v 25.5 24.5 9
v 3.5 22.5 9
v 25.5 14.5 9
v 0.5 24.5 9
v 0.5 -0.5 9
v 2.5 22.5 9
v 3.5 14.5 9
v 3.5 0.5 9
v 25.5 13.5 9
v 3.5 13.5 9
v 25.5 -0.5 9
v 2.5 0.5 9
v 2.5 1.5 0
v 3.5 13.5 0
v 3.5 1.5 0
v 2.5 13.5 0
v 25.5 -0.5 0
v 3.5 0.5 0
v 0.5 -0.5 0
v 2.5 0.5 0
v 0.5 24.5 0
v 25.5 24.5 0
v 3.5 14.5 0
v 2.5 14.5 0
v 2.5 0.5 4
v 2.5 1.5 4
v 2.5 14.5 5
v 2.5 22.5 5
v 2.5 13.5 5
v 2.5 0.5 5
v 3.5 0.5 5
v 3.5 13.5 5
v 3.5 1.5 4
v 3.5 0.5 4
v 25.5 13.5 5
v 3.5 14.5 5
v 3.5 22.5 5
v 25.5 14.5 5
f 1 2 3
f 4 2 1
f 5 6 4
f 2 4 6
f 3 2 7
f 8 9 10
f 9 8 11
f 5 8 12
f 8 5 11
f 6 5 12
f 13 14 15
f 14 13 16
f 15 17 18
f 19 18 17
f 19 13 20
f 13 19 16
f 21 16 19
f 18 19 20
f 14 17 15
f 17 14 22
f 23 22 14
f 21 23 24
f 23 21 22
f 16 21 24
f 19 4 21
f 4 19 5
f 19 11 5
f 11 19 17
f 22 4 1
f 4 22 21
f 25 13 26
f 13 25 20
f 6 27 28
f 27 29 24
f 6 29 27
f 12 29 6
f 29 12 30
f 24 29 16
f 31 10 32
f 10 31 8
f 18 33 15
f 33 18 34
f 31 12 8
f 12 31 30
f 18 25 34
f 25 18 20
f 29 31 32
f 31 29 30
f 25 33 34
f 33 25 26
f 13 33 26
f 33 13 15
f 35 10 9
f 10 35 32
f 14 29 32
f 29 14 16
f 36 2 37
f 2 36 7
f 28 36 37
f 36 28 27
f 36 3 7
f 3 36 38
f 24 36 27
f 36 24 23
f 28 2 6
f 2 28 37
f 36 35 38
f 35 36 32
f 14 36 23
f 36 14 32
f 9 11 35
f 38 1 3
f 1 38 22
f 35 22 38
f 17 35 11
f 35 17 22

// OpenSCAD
union() {
    translate([1, 0, 4.5]) cube([1, 1, 9], center=true);
    translate([1, 1, 4.5]) cube([1, 1, 9], center=true);
    translate([1, 2, 4.5]) cube([1, 1, 9], center=true);
    translate([1, 3, 4.5]) cube([1, 1, 9], center=true);
    translate([1, 4, 4.5]) cube([1, 1, 9], center=true);
    translate([1, 5, 4.5]) cube([1, 1, 9], center=true);
    translate([1, 6, 4.5]) cube([1, 1, 9], center=true);
    translate([1, 7, 4.5]) cube([1, 1, 9], center=true);
    translate([1, 8, 4.5]) cube([1, 1, 9], center=true);
    translate([1, 9, 4.5]) cube([1, 1, 9], center=true);
    translate([1, 10, 4.5]) cube([1, 1, 9], center=true);
    translate([1, 11, 4.5]) cube([1, 1, 9], center=true);
    translate([1, 12, 4.5]) cube([1, 1, 9], center=true);
    translate([1, 13, 4.5]) cube([1, 1, 9], center=true);
    translate([1, 14, 4.5]) cube([1, 1, 9], center=true);
    translate([1, 15, 4.5]) cube([1, 1, 9], center=true);
    translate([1, 16, 4.5]) cube([1, 1, 9], center=true);
    translate([1, 17, 4.5]) cube([1, 1, 9], center=true);
    translate([1, 18, 4.5]) cube([1, 1, 9], center=true);
    translate([1, 19, 4.5]) cube([1, 1, 9], center=true);
    translate([1, 20, 4.5]) cube([1, 1, 9], center=true);
    translate([1, 21, 4.5]) cube([1, 1, 9], center=true);
    translate([1, 22, 4.5]) cube([1, 1, 9], center=true);
    translate([1, 23, 4.5]) cube([1, 1, 9], center=true);
    translate([1, 24, 4.5]) cube([1, 1, 9], center=true);
    translate([2, 0, 4.5]) cube([1, 1, 9], center=true);
    translate([2, 1, 4.5]) cube([1, 1, 9], center=true);
    translate([2, 2, 4.5]) cube([1, 1, 9], center=true);
    translate([2, 3, 4.5]) cube([1, 1, 9], center=true);
    translate([2, 4, 4.5]) cube([1, 1, 9], center=true);
    translate([2, 5, 4.5]) cube([1, 1, 9], center=true);
    translate([2, 6, 4.5]) cube([1, 1, 9], center=true);
    translate([2, 7, 4.5]) cube([1, 1, 9], center=true);
    translate([2, 8, 4.5]) cube([1, 1, 9], center=true);
    translate([2, 9, 4.5]) cube([1, 1, 9], center=true);
    translate([2, 10, 4.5]) cube([1, 1, 9], center=true);
    translate([2, 11, 4.5]) cube([1, 1, 9], center=true);
    translate([2, 12, 4.5]) cube([1, 1, 9], center=true);
    translate([2, 13, 4.5]) cube([1, 1, 9], center=true);
    translate([2, 14, 4.5]) cube([1, 1, 9], center=true);
    translate([2, 15, 4.5]) cube([1, 1, 9], center=true);
    translate([2, 16, 4.5]) cube([1, 1, 9], center=true);
    translate([2, 17, 4.5]) cube([1, 1, 9], center=true);
    translate([2, 18, 4.5]) cube([1, 1, 9], center=true);
    translate([2, 19, 4.5]) cube([1, 1, 9], center=true);
    translate([2, 20, 4.5]) cube([1, 1, 9], center=true);
    translate([2, 21, 4.5]) cube([1, 1, 9], center=true);
    translate([2, 22, 4.5]) cube([1, 1, 9], center=true);
    translate([2, 23, 4.5]) cube([1, 1, 9], center=true);
    translate([2, 24, 4.5]) cube([1, 1, 9], center=true);
    translate([3, 0, 4.5]) cube([1, 1, 9], center=true);
    translate([3, 1, 4.5]) color([1, 0, 0]) cube([1, 1, 1], center=true);
    translate([3, 2, 2.5]) cube([1, 1, 5], center=true);
    translate([3, 3, 2.5]) cube([1, 1, 5], center=true);
    translate([3, 4, 2.5]) cube([1, 1, 5], center=true);
    translate([3, 5, 2.5]) cube([1, 1, 5], center=true);
    translate([3, 6, 2.5]) cube([1, 1, 5], center=true);
    translate([3, 7, 2.5]) cube([1, 1, 5], center=true);
    translate([3, 8, 2.5]) cube([1, 1, 5], center=true);
    translate([3, 9, 2.5]) cube([1, 1, 5], center=true);
    translate([3, 10, 2.5]) cube([1, 1, 5], center=true);
    translate([3, 11, 2.5]) cube([1, 1, 5], center=true);
    translate([3, 12, 2.5]) cube([1, 1, 5], center=true);
    translate([3, 13, 2.5]) cube([1, 1, 5], center=true);
    translate([3, 15, 2.5]) cube([1, 1, 5], center=true);
    translate([3, 16, 2.5]) cube([1, 1, 5], center=true);
    translate([3, 17, 2.5]) cube([1, 1, 5], center=true);
    translate([3, 18, 2.5]) cube([1, 1, 5], center=true);
    translate([3, 19, 2.5]) cube([1, 1, 5], center=true);
    translate([3, 20, 2.5]) cube([1, 1, 5], center=true);
    translate([3, 21, 2.5]) cube([1, 1, 5], center=true);
    translate([3, 22, 2.5]) cube([1, 1, 5], center=true);
    translate([3, 23, 4.5]) cube([1, 1, 9], center=true);
    translate([3, 24, 4.5]) cube([1, 1, 9], center=true);
    translate([4, 0, 4.5]) cube([1, 1, 9], center=true);
    translate([4, 1, 4.5]) cube([1, 1, 9], center=true);
    translate([4, 2, 4.5]) cube([1, 1, 9], center=true);
    translate([4, 3, 4.5]) cube([1, 1, 9], center=true);
    translate([4, 4, 4.5]) cube([1, 1, 9], center=true);
    translate([4, 5, 4.5]) cube([1, 1, 9], center=true);
    translate([4, 6, 4.5]) cube([1, 1, 9], center=true);
    translate([4, 7, 4.5]) cube([1, 1, 9], center=true);
    translate([4, 8, 4.5]) cube([1, 1, 9], center=true);
    translate([4, 9, 4.5]) cube([1, 1, 9], center=true);
    translate([4, 10, 4.5]) cube([1, 1, 9], center=true);
    translate([4, 11, 4.5]) cube([1, 1, 9], center=true);
    translate([4, 12, 4.5]) cube([1, 1, 9], center=true);
    translate([4, 13, 4.5]) cube([1, 1, 9], center=true);
    translate([4, 14, 2.5]) cube([1, 1, 5], center=true);
    translate([4, 15, 4.5]) cube([1, 1, 9], center=true);
    translate([4, 16, 4.5]) cube([1, 1, 9], center=true);
    translate([4, 17, 4.5]) cube([1, 1, 9], center=true);
    translate([4, 18, 4.5]) cube([1, 1, 9], center=true);
    translate([4, 19, 4.5]) cube([1, 1, 9], center=true);
    translate([4, 20, 4.5]) cube([1, 1, 9], center=true);
    translate([4, 21, 4.5]) cube([1, 1, 9], center=true);
    translate([4, 22, 4.5]) cube([1, 1, 9], center=true);
    translate([4, 23, 4.5]) cube([1, 1, 9], center=true);
    translate([4, 24, 4.5]) cube([1, 1, 9], center=true);
    translate([5, 0, 4.5]) cube([1, 1, 9], center=true);
    translate([5, 1, 4.5]) cube([1, 1, 9], center=true);
    translate([5, 2, 4.5]) cube([1, 1, 9], center=true);
    translate([5, 3, 4.5]) cube([1, 1, 9], center=true);
    translate([5, 4, 4.5]) cube([1, 1, 9], center=true);
    translate([5, 5, 4.5]) cube([1, 1, 9], center=true);
    translate([5, 6, 4.5]) cube([1, 1, 9], center=true);
    translate([5, 7, 4.5]) cube([1, 1, 9], center=true);
    translate([5, 8, 4.5]) cube([1, 1, 9], center=true);
    translate([5, 9, 4.5]) cube([1, 1, 9], center=true);
    translate([5, 10, 4.5]) cube([1, 1, 9], center=true);
    translate([5, 11, 4.5]) cube([1, 1, 9], center=true);
    translate([5, 12, 4.5]) cube([1, 1, 9], center=true);
    translate([5, 13, 4.5]) cube([1, 1, 9], center=true);
    translate([5, 14, 2.5]) cube([1, 1, 5], center=true);
    translate([5, 15, 4.5]) cube([1, 1, 9], center=true);
    translate([5, 16, 4.5]) cube([1, 1, 9], center=true);
    translate([5, 17, 4.5]) cube([1, 1, 9], center=true);
    translate([5, 18, 4.5]) cube([1, 1, 9], center=true);
    translate([5, 19, 4.5]) cube([1, 1, 9], center=true);
    translate([5, 20, 4.5]) cube([1, 1, 9], center=true);
    translate([5, 21, 4.5]) cube([1, 1, 9], center=true);
    translate([5, 22, 4.5]) cube([1, 1, 9], center=true);
    translate([5, 23, 4.5]) cube([1, 1, 9], center=true);
    translate([5, 24, 4.5]) cube([1, 1, 9], center=true);
    translate([6, 0, 4.5]) cube([1, 1, 9], center=true);
    translate([6, 1, 4.5]) cube([1, 1, 9], center=true);
    translate([6, 2, 4.5]) cube([1, 1, 9], center=true);
    translate([6, 3, 4.5]) cube([1, 1, 9], center=true);
    translate([6, 4, 4.5]) cube([1, 1, 9], center=true);
    translate([6, 5, 4.5]) cube([1, 1, 9], center=true);
    translate([6, 6, 4.5]) cube([1, 1, 9], center=true);
    translate([6, 7, 4.5]) cube([1, 1, 9], center=true);
    translate([6, 8, 4.5]) cube([1, 1, 9], center=true);
    translate([6, 9, 4.5]) cube([1, 1, 9], center=true);
    translate([6, 10, 4.5]) cube([1, 1, 9], center=true);
    translate([6, 11, 4.5]) cube([1, 1, 9], center=true);
    translate([6, 12, 4.5]) cube([1, 1, 9], center=true);
    translate([6, 13, 4.5]) cube([1, 1, 9], center=true);
    translate([6, 14, 2.5]) cube([1, 1, 5], center=true);
    translate([6, 15, 4.5]) cube([1, 1, 9], center=true);
    translate([6, 16, 4.5]) cube([1, 1, 9], center=true);
    translate([6, 17, 4.5]) cube([1, 1, 9], center=true);
    translate([6, 18, 4.5]) cube([1, 1, 9], center=true);
    translate([6, 19, 4.5]) cube([1, 1, 9], center=true);
    translate([6, 20, 4.5]) cube([1, 1, 9], center=true);
    translate([6, 21, 4.5]) cube([1, 1, 9], center=true);
    translate([6, 22, 4.5]) cube([1, 1, 9], center=true);
    translate([6, 23, 4.5]) cube([1, 1, 9], center=true);
    translate([6, 24, 4.5]) cube([1, 1, 9], center=true);
    translate([7, 0, 4.5]) cube([1, 1, 9], center=true);
    translate([7, 1, 4.5]) cube([1, 1, 9], center=true);
    translate([7, 2, 4.5]) cube([1, 1, 9], center=true);
    translate([7, 3, 4.5]) cube([1, 1, 9], center=true);
    translate([7, 4, 4.5]) cube([1, 1, 9], center=true);
    translate([7, 5, 4.5]) cube([1, 1, 9], center=true);
    translate([7, 6, 4.5]) cube([1, 1, 9], center=true);
    translate([7, 7, 4.5]) cube([1, 1, 9], center=true);
    translate([7, 8, 4.5]) cube([1, 1, 9], center=true);
    translate([7, 9, 4.5]) cube([1, 1, 9], center=true);
    translate([7, 10, 4.5]) cube([1, 1, 9], center=true);
    translate([7, 11, 4.5]) cube([1, 1, 9], center=true);
    translate([7, 12, 4.5]) cube([1, 1, 9], center=true);
    translate([7, 13, 4.5]) cube([1, 1, 9], center=true);
    translate([7, 14, 2.5]) cube([1, 1, 5], center=true);
    translate([7, 15, 4.5]) cube([1, 1, 9], center=true);
    translate([7, 16, 4.5]) cube([1, 1, 9], center=true);
    translate([7, 17, 4.5]) cube([1, 1, 9], center=true);
    translate([7, 18, 4.5]) cube([1, 1, 9], center=true);
    translate([7, 19, 4.5]) cube([1, 1, 9], center=true);
    translate([7, 20, 4.5]) cube([1, 1, 9], center=true);
    translate([7, 21, 4.5]) cube([1, 1, 9], center=true);
    translate([7, 22, 4.5]) cube([1, 1, 9], center=true);
    translate([7, 23, 4.5]) cube([1, 1, 9], center=true);
    translate([7, 24, 4.5]) cube([1, 1, 9], center=true);
    translate([8, 0, 4.5]) cube([1, 1, 9], center=true);
    translate([8, 1, 4.5]) cube([1, 1, 9], center=true);
    translate([8, 2, 4.5]) cube([1, 1, 9], center=true);
    translate([8, 3, 4.5]) cube([1, 1, 9], center=true);
    translate([8, 4, 4.5]) cube([1, 1, 9], center=true);
    translate([8, 5, 4.5]) cube([1, 1, 9], center=true);
    translate([8, 6, 4.5]) cube([1, 1, 9], center=true);
    translate([8, 7, 4.5]) cube([1, 1, 9], center=true);
    translate([8, 8, 4.5]) cube([1, 1, 9], center=true);
    translate([8, 9, 4.5]) cube([1, 1, 9], center=true);
    translate([8, 10, 4.5]) cube([1, 1, 9], center=true);
    translate([8, 11, 4.5]) cube([1, 1, 9], center=true);
    translate([8, 12, 4.5]) cube([1, 1, 9], center=true);
    translate([8, 13, 4.5]) cube([1, 1, 9], center=true);
    translate([8, 14, 2.5]) cube([1, 1, 5], center=true);
    translate([8, 15, 4.5]) cube([1, 1, 9], center=true);
    translate([8, 16, 4.5]) cube([1, 1, 9], center=true);
    translate([8, 17, 4.5]) cube([1, 1, 9], center=true);
    translate([8, 18, 4.5]) cube([1, 1, 9], center=true);
    translate([8, 19, 4.5]) cube([1, 1, 9], center=true);
    translate([8, 20, 4.5]) cube([1, 1, 9], center=true);
    translate([8, 21, 4.5]) cube([1, 1, 9], center=true);
    translate([8, 22, 4.5]) cube([1, 1, 9], center=true);
    translate([8, 23, 4.5]) cube([1, 1, 9], center=true);
    translate([8, 24, 4.5]) cube([1, 1, 9], center=true);
    translate([9, 0, 4.5]) cube([1, 1, 9], center=true);
    translate([9, 1, 4.5]) cube([1, 1, 9], center=true);
    translate([9, 2, 4.5]) cube([1, 1, 9], center=true);
    translate([9, 3, 4.5]) cube([1, 1, 9], center=true);
    translate([9, 4, 4.5]) cube([1, 1, 9], center=true);
    translate([9, 5, 4.5]) cube([1, 1, 9], center=true);
    translate([9, 6, 4.5]) cube([1, 1, 9], center=true);
    translate([9, 7, 4.5]) cube([1, 1, 9], center=true);
    translate([9, 8, 4.5]) cube([1, 1, 9], center=true);
    translate([9, 9, 4.5]) cube([1, 1, 9], center=true);
    translate([9, 10, 4.5]) cube([1, 1, 9], center=true);
    translate([9, 11, 4.5]) cube([1, 1, 9], center=true);
    translate([9, 12, 4.5]) cube([1, 1, 9], center=true);
    translate([9, 13, 4.5]) cube([1, 1, 9], center=true);
    translate([9, 14, 2.5]) cube([1, 1, 5], center=true);
    translate([9, 15, 4.5]) cube([1, 1, 9], center=true);
    translate([9, 16, 4.5]) cube([1, 1, 9], center=true);
    translate([9, 17, 4.5]) cube([1, 1, 9], center=true);
    translate([9, 18, 4.5]) cube([1, 1, 9], center=true);
    translate([9, 19, 4.5]) cube([1, 1, 9], center=true);
    translate([9, 20, 4.5]) cube([1, 1, 9], center=true);
    translate([9, 21, 4.5]) cube([1, 1, 9], center=true);
    translate([9, 22, 4.5]) cube([1, 1, 9], center=true);
    translate([9, 23, 4.5]) cube([1, 1, 9], center=true);
    translate([9, 24, 4.5]) cube([1, 1, 9], center=true);
    translate([10, 0, 4.5]) cube([1, 1, 9], center=true);
    translate([10, 1, 4.5]) cube([1, 1, 9], center=true);
    translate([10, 2, 4.5]) cube([1, 1, 9], center=true);
    translate([10, 3, 4.5]) cube([1, 1, 9], center=true);
    translate([10, 4, 4.5]) cube([1, 1, 9], center=true);
    translate([10, 5, 4.5]) cube([1, 1, 9], center=true);
    translate([10, 6, 4.5]) cube([1, 1, 9], center=true);
    translate([10, 7, 4.5]) cube([1, 1, 9], center=true);
    translate([10, 8, 4.5]) cube([1, 1, 9], center=true);
    translate([10, 9, 4.5]) cube([1, 1, 9], center=true);
    translate([10, 10, 4.5]) cube([1, 1, 9], center=true);
    translate([10, 11, 4.5]) cube([1, 1, 9], center=true);
    translate([10, 12, 4.5]) cube([1, 1, 9], center=true);
    translate([10, 13, 4.5]) cube([1, 1, 9], center=true);
    translate([10, 14, 2.5]) cube([1, 1, 5], center=true);
    translate([10, 15, 4.5]) cube([1, 1, 9], center=true);
    translate([10, 16, 4.5]) cube([1, 1, 9], center=true);
    translate([10, 17, 4.5]) cube([1, 1, 9], center=true);
    translate([10, 18, 4.5]) cube([1, 1, 9], center=true);
    translate([10, 19, 4.5]) cube([1, 1, 9], center=true);
    translate([10, 20, 4.5]) cube([1, 1, 9], center=true);
    translate([10, 21, 4.5]) cube([1, 1, 9], center=true);
    translate([10, 22, 4.5]) cube([1, 1, 9], center=true);
    translate([10, 23, 4.5]) cube([1, 1, 9], center=true);
    translate([10, 24, 4.5]) cube([1, 1, 9], center=true);
    translate([11, 0, 4.5]) cube([1, 1, 9], center=true);
    translate([11, 1, 4.5]) cube([1, 1, 9], center=true);
    translate([11, 2, 4.5]) cube([1, 1, 9], center=true);
    translate([11, 3, 4.5]) cube([1, 1, 9], center=true);
    translate([11, 4, 4.5]) cube([1, 1, 9], center=true);
    translate([11, 5, 4.5]) cube([1, 1, 9], center=true);
    translate([11, 6, 4.5]) cube([1, 1, 9], center=true);
    translate([11, 7, 4.5]) cube([1, 1, 9], center=true);
    translate([11, 8, 4.5]) cube([1, 1, 9], center=true);
    translate([11, 9, 4.5]) cube([1, 1, 9], center=true);
    translate([11, 10, 4.5]) cube([1, 1, 9], center=true);
    translate([11, 11, 4.5]) cube([1, 1, 9], center=true);
    translate([11, 12, 4.5]) cube([1, 1, 9], center=true);
    translate([11, 13, 4.5]) cube([1, 1, 9], center=true);
    translate([11, 14, 2.5]) cube([1, 1, 5], center=true);
    translate([11, 15, 4.5]) cube([1, 1, 9], center=true);
    translate([11, 16, 4.5]) cube([1, 1, 9], center=true);
    translate([11, 17, 4.5]) cube([1, 1, 9], center=true);
    translate([11, 18, 4.5]) cube([1, 1, 9], center=true);
    translate([11, 19, 4.5]) cube([1, 1, 9], center=true);
    translate([11, 20, 4.5]) cube([1, 1, 9], center=true);
    translate([11, 21, 4.5]) cube([1, 1, 9], center=true);
    translate([11, 22, 4.5]) cube([1, 1, 9], center=true);
    translate([11, 23, 4.5]) cube([1, 1, 9], center=true);
    translate([11, 24, 4.5]) cube([1, 1, 9], center=true);
    translate([12, 0, 4.5]) cube([1, 1, 9], center=true);
    translate([12, 1, 4.5]) cube([1, 1, 9], center=true);
    translate([12, 2, 4.5]) cube([1, 1, 9], center=true);
    translate([12, 3, 4.5]) cube([1, 1, 9], center=true);
    translate([12, 4, 4.5]) cube([1, 1, 9], center=true);
    translate([12, 5, 4.5]) cube([1, 1, 9], center=true);
    translate([12, 6, 4.5]) cube([1, 1, 9], center=true);
    translate([12, 7, 4.5]) cube([1, 1, 9], center=true);
    translate([12, 8, 4.5]) cube([1, 1, 9], center=true);
    translate([12, 9, 4.5]) cube([1, 1, 9], center=true);
    translate([12, 10, 4.5]) cube([1, 1, 9], center=true);
    translate([12, 11, 4.5]) cube([1, 1, 9], center=true);
    translate([12, 12, 4.5]) cube([1, 1, 9], center=true);
    translate([12, 13, 4.5]) cube([1, 1, 9], center=true);
    translate([12, 14, 2.5]) cube([1, 1, 5], center=true);
    translate([12, 15, 4.5]) cube([1, 1, 9], center=true);
    translate([12, 16, 4.5]) cube([1, 1, 9], center=true);
    translate([12, 17, 4.5]) cube([1, 1, 9], center=true);
    translate([12, 18, 4.5]) cube([1, 1, 9], center=true);
    translate([12, 19, 4.5]) cube([1, 1, 9], center=true);
    translate([12, 20, 4.5]) cube([1, 1, 9], center=true);
    translate([12, 21, 4.5]) cube([1, 1, 9], center=true);
    translate([12, 22, 4.5]) cube([1, 1, 9], center=true);
    translate([12, 23, 4.5]) cube([1, 1, 9], center=true);
    translate([12, 24, 4.5]) cube([1, 1, 9], center=true);
    translate([13, 0, 4.5]) cube([1, 1, 9], center=true);
    translate([13, 1, 4.5]) cube([1, 1, 9], center=true);
    translate([13, 2, 4.5]) cube([1, 1, 9], center=true);
    translate([13, 3, 4.5]) cube([1, 1, 9], center=true);
    translate([13, 4, 4.5]) cube([1, 1, 9], center=true);
    translate([13, 5, 4.5]) cube([1, 1, 9], center=true);
    translate([13, 6, 4.5]) cube([1, 1, 9], center=true);
    translate([13, 7, 4.5]) cube([1, 1, 9], center=true);
    translate([13, 8, 4.5]) cube([1, 1, 9], center=true);
    translate([13, 9, 4.5]) cube([1, 1, 9], center=true);
    translate([13, 10, 4.5]) cube([1, 1, 9], center=true);
    translate([13, 11, 4.5]) cube([1, 1, 9], center=true);
    translate([13, 12, 4.5]) cube([1, 1, 9], center=true);
    translate([13, 13, 4.5]) cube([1, 1, 9], center=true);
    translate([13, 14, 2.5]) cube([1, 1, 5], center=true);
    translate([13, 15, 4.5]) cube([1, 1, 9], center=true);
    translate([13, 16, 4.5]) cube([1, 1, 9], center=true);
    translate([13, 17, 4.5]) cube([1, 1, 9], center=true);
    translate([13, 18, 4.5]) cube([1, 1, 9], center=true);
    translate([13, 19, 4.5]) cube([1, 1, 9], center=true);
    translate([13, 20, 4.5]) cube([1, 1, 9], center=true);
    translate([13, 21, 4.5]) cube([1, 1, 9], center=true);
    translate([13, 22, 4.5]) cube([1, 1, 9], center=true);
    translate([13, 23, 4.5]) cube([1, 1, 9], center=true);
    translate([13, 24, 4.5]) cube([1, 1, 9], center=true);
    translate([14, 0, 4.5]) cube([1, 1, 9], center=true);
    translate([14, 1, 4.5]) cube([1, 1, 9], center=true);
    translate([14, 2, 4.5]) cube([1, 1, 9], center=true);
    translate([14, 3, 4.5]) cube([1, 1, 9], center=true);
    translate([14, 4, 4.5]) cube([1, 1, 9], center=true);
    translate([14, 5, 4.5]) cube([1, 1, 9], center=true);
    translate([14, 6, 4.5]) cube([1, 1, 9], center=true);
    translate([14, 7, 4.5]) cube([1, 1, 9], center=true);
    translate([14, 8, 4.5]) cube([1, 1, 9], center=true);
    translate([14, 9, 4.5]) cube([1, 1, 9], center=true);
    translate([14, 10, 4.5]) cube([1, 1, 9], center=true);
    translate([14, 11, 4.5]) cube([1, 1, 9], center=true);
    translate([14, 12, 4.5]) cube([1, 1, 9], center=true);
    translate([14, 13, 4.5]) cube([1, 1, 9], center=true);
    translate([14, 14, 2.5]) cube([1, 1, 5], center=true);
    translate([14, 15, 4.5]) cube([1, 1, 9], center=true);
    translate([14, 16, 4.5]) cube([1, 1, 9], center=true);
    translate([14, 17, 4.5]) cube([1, 1, 9], center=true);
    translate([14, 18, 4.5]) cube([1, 1, 9], center=true);
    translate([14, 19, 4.5]) cube([1, 1, 9], center=true);
    translate([14, 20, 4.5]) cube([1, 1, 9], center=true);
    translate([14, 21, 4.5]) cube([1, 1, 9], center=true);
    translate([14, 22, 4.5]) cube([1, 1, 9], center=true);
    translate([14, 23, 4.5]) cube([1, 1, 9], center=true);
    translate([14, 24, 4.5]) cube([1, 1, 9], center=true);
    translate([15, 0, 4.5]) cube([1, 1, 9], center=true);
    translate([15, 1, 4.5]) cube([1, 1, 9], center=true);
    translate([15, 2, 4.5]) cube([1, 1, 9], center=true);
    translate([15, 3, 4.5]) cube([1, 1, 9], center=true);
    translate([15, 4, 4.5]) cube([1, 1, 9], center=true);
    translate([15, 5, 4.5]) cube([1, 1, 9], center=true);
    translate([15, 6, 4.5]) cube([1, 1, 9], center=true);
    translate([15, 7, 4.5]) cube([1, 1, 9], center=true);
    translate([15, 8, 4.5]) cube([1, 1, 9], center=true);
    translate([15, 9, 4.5]) cube([1, 1, 9], center=true);
    translate([15, 10, 4.5]) cube([1, 1, 9], center=true);
    translate([15, 11, 4.5]) cube([1, 1, 9], center=true);
    translate([15, 12, 4.5]) cube([1, 1, 9], center=true);
    translate([15, 13, 4.5]) cube([1, 1, 9], center=true);
    translate([15, 14, 2.5]) cube([1, 1, 5], center=true);
    translate([15, 15, 4.5]) cube([1, 1, 9], center=true);
    translate([15, 16, 4.5]) cube([1, 1, 9], center=true);
    translate([15, 17, 4.5]) cube([1, 1, 9], center=true);
    translate([15, 18, 4.5]) cube([1, 1, 9], center=true);
    translate([15, 19, 4.5]) cube([1, 1, 9], center=true);
    translate([15, 20, 4.5]) cube([1, 1, 9], center=true);
    translate([15, 21, 4.5]) cube([1, 1, 9], center=true);
    translate([15, 22, 4.5]) cube([1, 1, 9], center=true);
    translate([15, 23, 4.5]) cube([1, 1, 9], center=true);
    translate([15, 24, 4.5]) cube([1, 1, 9], center=true);
    translate([16, 0, 4.5]) cube([1, 1, 9], center=true);
    translate([16, 1, 4.5]) cube([1, 1, 9], center=true);
    translate([16, 2, 4.5]) cube([1, 1, 9], center=true);
    translate([16, 3, 4.5]) cube([1, 1, 9], center=true);
    translate([16, 4, 4.5]) cube([1, 1, 9], center=true);
    translate([16, 5, 4.5]) cube([1, 1, 9], center=true);
    translate([16, 6, 4.5]) cube([1, 1, 9], center=true);
    translate([16, 7, 4.5]) cube([1, 1, 9], center=true);
    translate([16, 8, 4.5]) cube([1, 1, 9], center=true);
    translate([16, 9, 4.5]) cube([1, 1, 9], center=true);
    translate([16, 10, 4.5]) cube([1, 1, 9], center=true);
    translate([16, 11, 4.5]) cube([1, 1, 9], center=true);
    translate([16, 12, 4.5]) cube([1, 1, 9], center=true);
    translate([16, 13, 4.5]) cube([1, 1, 9], center=true);
    translate([16, 14, 2.5]) cube([1, 1, 5], center=true);
    translate([16, 15, 4.5]) cube([1, 1, 9], center=true);
    translate([16, 16, 4.5]) cube([1, 1, 9], center=true);
    translate([16, 17, 4.5]) cube([1, 1, 9], center=true);
    translate([16, 18, 4.5]) cube([1, 1, 9], center=true);
    translate([16, 19, 4.5]) cube([1, 1, 9], center=true);
    translate([16, 20, 4.5]) cube([1, 1, 9], center=true);
    translate([16, 21, 4.5]) cube([1, 1, 9], center=true);
    translate([16, 22, 4.5]) cube([1, 1, 9], center=true);
    translate([16, 23, 4.5]) cube([1, 1, 9], center=true);
    translate([16, 24, 4.5]) cube([1, 1, 9], center=true);
    translate([17, 0, 4.5]) cube([1, 1, 9], center=true);
    translate([17, 1, 4.5]) cube([1, 1, 9], center=true);
    translate([17, 2, 4.5]) cube([1, 1, 9], center=true);
    translate([17, 3, 4.5]) cube([1, 1, 9], center=true);
    translate([17, 4, 4.5]) cube([1, 1, 9], center=true);
    translate([17, 5, 4.5]) cube([1, 1, 9], center=true);
    translate([17, 6, 4.5]) cube([1, 1, 9], center=true);
    translate([17, 7, 4.5]) cube([1, 1, 9], center=true);
    translate([17, 8, 4.5]) cube([1, 1, 9], center=true);
    translate([17, 9, 4.5]) cube([1, 1, 9], center=true);
    translate([17, 10, 4.5]) cube([1, 1, 9], center=true);
    translate([17, 11, 4.5]) cube([1, 1, 9], center=true);
    translate([17, 12, 4.5]) cube([1, 1, 9], center=true);
    translate([17, 13, 4.5]) cube([1, 1, 9], center=true);
    translate([17, 14, 2.5]) cube([1, 1, 5], center=true);
    translate([17, 15, 4.5]) cube([1, 1, 9], center=true);
    translate([17, 16, 4.5]) cube([1, 1, 9], center=true);
    translate([17, 17, 4.5]) cube([1, 1, 9], center=true);
    translate([17, 18, 4.5]) cube([1, 1, 9], center=true);
    translate([17, 19, 4.5]) cube([1, 1, 9], center=true);
    translate([17, 20, 4.5]) cube([1, 1, 9], center=true);
    translate([17, 21, 4.5]) cube([1, 1, 9], center=true);
    translate([17, 22, 4.5]) cube([1, 1, 9], center=true);
    translate([17, 23, 4.5]) cube([1, 1, 9], center=true);
    translate([17, 24, 4.5]) cube([1, 1, 9], center=true);
    translate([18, 0, 4.5]) cube([1, 1, 9], center=true);
    translate([18, 1, 4.5]) cube([1, 1, 9], center=true);
    translate([18, 2, 4.5]) cube([1, 1, 9], center=true);
    translate([18, 3, 4.5]) cube([1, 1, 9], center=true);
    translate([18, 4, 4.5]) cube([1, 1, 9], center=true);
    translate([18, 5, 4.5]) cube([1, 1, 9], center=true);
    translate([18, 6, 4.5]) cube([1, 1, 9], center=true);
    translate([18, 7, 4.5]) cube([1, 1, 9], center=true);
    translate([18, 8, 4.5]) cube([1, 1, 9], center=true);
    translate([18, 9, 4.5]) cube([1, 1, 9], center=true);
    translate([18, 10, 4.5]) cube([1, 1, 9], center=true);
    translate([18, 11, 4.5]) cube([1, 1, 9], center=true);
    translate([18, 12, 4.5]) cube([1, 1, 9], center=true);
    translate([18, 13, 4.5]) cube([1, 1, 9], center=true);
    translate([18, 14, 2.5]) cube([1, 1, 5], center=true);
    translate([18, 15, 4.5]) cube([1, 1, 9], center=true);
    translate([18, 16, 4.5]) cube([1, 1, 9], center=true);
    translate([18, 17, 4.5]) cube([1, 1, 9], center=true);
    translate([18, 18, 4.5]) cube([1, 1, 9], center=true);
    translate([18, 19, 4.5]) cube([1, 1, 9], center=true);
    translate([18, 20, 4.5]) cube([1, 1, 9], center=true);
    translate([18, 21, 4.5]) cube([1, 1, 9], center=true);
    translate([18, 22, 4.5]) cube([1, 1, 9], center=true);
    translate([18, 23, 4.5]) cube([1, 1, 9], center=true);
    translate([18, 24, 4.5]) cube([1, 1, 9], center=true);
    translate([19, 0, 4.5]) cube([1, 1, 9], center=true);
    translate([19, 1, 4.5]) cube([1, 1, 9], center=true);
    translate([19, 2, 4.5]) cube([1, 1, 9], center=true);
    translate([19, 3, 4.5]) cube([1, 1, 9], center=true);
    translate([19, 4, 4.5]) cube([1, 1, 9], center=true);
    translate([19, 5, 4.5]) cube([1, 1, 9], center=true);
    translate([19, 6, 4.5]) cube([1, 1, 9], center=true);
    translate([19, 7, 4.5]) cube([1, 1, 9], center=true);
    translate([19, 8, 4.5]) cube([1, 1, 9], center=true);
    translate([19, 9, 4.5]) cube([1, 1, 9], center=true);
    translate([19, 10, 4.5]) cube([1, 1, 9], center=true);
    translate([19, 11, 4.5]) cube([1, 1, 9], center=true);
    translate([19, 12, 4.5]) cube([1, 1, 9], center=true);
    translate([19, 13, 4.5]) cube([1, 1, 9], center=true);
    translate([19, 14, 2.5]) cube([1, 1, 5], center=true);
    translate([19, 15, 4.5]) cube([1, 1, 9], center=true);
    translate([19, 16, 4.5]) cube([1, 1, 9], center=true);
    translate([19, 17, 4.5]) cube([1, 1, 9], center=true);
    translate([19, 18, 4.5]) cube([1, 1, 9], center=true);
    translate([19, 19, 4.5]) cube([1, 1, 9], center=true);
    translate([19, 20, 4.5]) cube([1, 1, 9], center=true);
    translate([19, 21, 4.5]) cube([1, 1, 9], center=true);
    translate([19, 22, 4.5]) cube([1, 1, 9], center=true);
    translate([19, 23, 4.5]) cube([1, 1, 9], center=true);
    translate([19, 24, 4.5]) cube([1, 1, 9], center=true);
    translate([20, 0, 4.5]) cube([1, 1, 9], center=true);
    translate([20, 1, 4.5]) cube([1, 1, 9], center=true);
    translate([20, 2, 4.5]) cube([1, 1, 9], center=true);
    translate([20, 3, 4.5]) cube([1, 1, 9], center=true);
    translate([20, 4, 4.5]) cube([1, 1, 9], center=true);
    translate([20, 5, 4.5]) cube([1, 1, 9], center=true);
    translate([20, 6, 4.5]) cube([1, 1, 9], center=true);
    translate([20, 7, 4.5]) cube([1, 1, 9], center=true);
    translate([20, 8, 4.5]) cube([1, 1, 9], center=true);
    translate([20, 9, 4.5]) cube([1, 1, 9], center=true);
    translate([20, 10, 4.5]) cube([1, 1, 9], center=true);
    translate([20, 11, 4.5]) cube([1, 1, 9], center=true);
    translate([20, 12, 4.5]) cube([1, 1, 9], center=true);
    translate([20, 13, 4.5]) cube([1, 1, 9], center=true);
    translate([20, 14, 2.5]) cube([1, 1, 5], center=true);
    translate([20, 15, 4.5]) cube([1, 1, 9], center=true);
    translate([20, 16, 4.5]) cube([1, 1, 9], center=true);
    translate([20, 17, 4.5]) cube([1, 1, 9], center=true);
    translate([20, 18, 4.5]) cube([1, 1, 9], center=true);
    translate([20, 19, 4.5]) cube([1, 1, 9], center=true);
    translate([20, 20, 4.5]) cube([1, 1, 9], center=true);
    translate([20, 21, 4.5]) cube([1, 1, 9], center=true);
    translate([20, 22, 4.5]) cube([1, 1, 9], center=true);
    translate([20, 23, 4.5]) cube([1, 1, 9], center=true);
    translate([20, 24, 4.5]) cube([1, 1, 9], center=true);
    translate([21, 0, 4.5]) cube([1, 1, 9], center=true);
    translate([21, 1, 4.5]) cube([1, 1, 9], center=true);
    translate([21, 2, 4.5]) cube([1, 1, 9], center=true);
    translate([21, 3, 4.5]) cube([1, 1, 9], center=true);
    translate([21, 4, 4.5]) cube([1, 1, 9], center=true);
    translate([21, 5, 4.5]) cube([1, 1, 9], center=true);
    translate([21, 6, 4.5]) cube([1, 1, 9], center=true);
    translate([21, 7, 4.5]) cube([1, 1, 9], center=true);
    translate([21, 8, 4.5]) cube([1, 1, 9], center=true);
    translate([21, 9, 4.5]) cube([1, 1, 9], center=true);
    translate([21, 10, 4.5]) cube([1, 1, 9], center=true);
    translate([21, 11, 4.5]) cube([1, 1, 9], center=true);
    translate([21, 12, 4.5]) cube([1, 1, 9], center=true);
    translate([21, 13, 4.5]) cube([1, 1, 9], center=true);
    translate([21, 14, 2.5]) cube([1, 1, 5], center=true);
    translate([21, 15, 4.5]) cube([1, 1, 9], center=true);
    translate([21, 16, 4.5]) cube([1, 1, 9], center=true);
    translate([21, 17, 4.5]) cube([1, 1, 9], center=true);
    translate([21, 18, 4.5]) cube([1, 1, 9], center=true);
    translate([21, 19, 4.5]) cube([1, 1, 9], center=true);
    translate([21, 20, 4.5]) cube([1, 1, 9], center=true);
    translate([21, 21, 4.5]) cube([1, 1, 9], center=true);
    translate([21, 22, 4.5]) cube([1, 1, 9], center=true);
    translate([21, 23, 4.5]) cube([1, 1, 9], center=true);
    translate([21, 24, 4.5]) cube([1, 1, 9], center=true);
    translate([22, 0, 4.5]) cube([1, 1, 9], center=true);
    translate([22, 1, 4.5]) cube([1, 1, 9], center=true);
    translate([22, 2, 4.5]) cube([1, 1, 9], center=true);
    translate([22, 3, 4.5]) cube([1, 1, 9], center=true);
    translate([22, 4, 4.5]) cube([1, 1, 9], center=true);
    translate([22, 5, 4.5]) cube([1, 1, 9], center=true);
    translate([22, 6, 4.5]) cube([1, 1, 9], center=true);
    translate([22, 7, 4.5]) cube([1, 1, 9], center=true);
    translate([22, 8, 4.5]) cube([1, 1, 9], center=true);
    translate([22, 9, 4.5]) cube([1, 1, 9], center=true);
    translate([22, 10, 4.5]) cube([1, 1, 9], center=true);
    translate([22, 11, 4.5]) cube([1, 1, 9], center=true);
    translate([22, 12, 4.5]) cube([1, 1, 9], center=true);
    translate([22, 13, 4.5]) cube([1, 1, 9], center=true);
    translate([22, 14, 2.5]) cube([1, 1, 5], center=true);
    translate([22, 15, 4.5]) cube([1, 1, 9], center=true);
    translate([22, 16, 4.5]) cube([1, 1, 9], center=true);
    translate([22, 17, 4.5]) cube([1, 1, 9], center=true);
    translate([22, 18, 4.5]) cube([1, 1, 9], center=true);
    translate([22, 19, 4.5]) cube([1, 1, 9], center=true);
    translate([22, 20, 4.5]) cube([1, 1, 9], center=true);
    translate([22, 21, 4.5]) cube([1, 1, 9], center=true);
    translate([22, 22, 4.5]) cube([1, 1, 9], center=true);
    translate([22, 23, 4.5]) cube([1, 1, 9], center=true);
    translate([22, 24, 4.5]) cube([1, 1, 9], center=true);
    translate([23, 0, 4.5]) cube([1, 1, 9], center=true);
    translate([23, 1, 4.5]) cube([1, 1, 9], center=true);
    translate([23, 2, 4.5]) cube([1, 1, 9], center=true);
    translate([23, 3, 4.5]) cube([1, 1, 9], center=true);
    translate([23, 4, 4.5]) cube([1, 1, 9], center=true);
    translate([23, 5, 4.5]) cube([1, 1, 9], center=true);
    translate([23, 6, 4.5]) cube([1, 1, 9], center=true);
    translate([23, 7, 4.5]) cube([1, 1, 9], center=true);
    translate([23, 8, 4.5]) cube([1, 1, 9], center=true);
    translate([23, 9, 4.5]) cube([1, 1, 9], center=true);
    translate([23, 10, 4.5]) cube([1, 1, 9], center=true);
    translate([23, 11, 4.5]) cube([1, 1, 9], center=true);
    translate([23, 12, 4.5]) cube([1, 1, 9], center=true);
    translate([23, 13, 4.5]) cube([1, 1, 9], center=true);
    translate([23, 14, 2.5]) cube([1, 1, 5], center=true);
    translate([23, 15, 4.5]) cube([1, 1, 9], center=true);
    translate([23, 16, 4.5]) cube([1, 1, 9], center=true);
    translate([23, 17, 4.5]) cube([1, 1, 9], center=true);
    translate([23, 18, 4.5]) cube([1, 1, 9], center=true);
    translate([23, 19, 4.5]) cube([1, 1, 9], center=true);
    translate([23, 20, 4.5]) cube([1, 1, 9], center=true);
    translate([23, 21, 4.5]) cube([1, 1, 9], center=true);
    translate([23, 22, 4.5]) cube([1, 1, 9], center=true);
    translate([23, 23, 4.5]) cube([1, 1, 9], center=true);
    translate([23, 24, 4.5]) cube([1, 1, 9], center=true);
    translate([24, 0, 4.5]) cube([1, 1, 9], center=true);
    translate([24, 1, 4.5]) cube([1, 1, 9], center=true);
    translate([24, 2, 4.5]) cube([1, 1, 9], center=true);
    translate([24, 3, 4.5]) cube([1, 1, 9], center=true);
    translate([24, 4, 4.5]) cube([1, 1, 9], center=true);
    translate([24, 5, 4.5]) cube([1, 1, 9], center=true);
    translate([24, 6, 4.5]) cube([1, 1, 9], center=true);
    translate([24, 7, 4.5]) cube([1, 1, 9], center=true);
    translate([24, 8, 4.5]) cube([1, 1, 9], center=true);
    translate([24, 9, 4.5]) cube([1, 1, 9], center=true);
    translate([24, 10, 4.5]) cube([1, 1, 9], center=true);
    translate([24, 11, 4.5]) cube([1, 1, 9], center=true);
    translate([24, 12, 4.5]) cube([1, 1, 9], center=true);
    translate([24, 13, 4.5]) cube([1, 1, 9], center=true);
    translate([24, 14, 2.5]) cube([1, 1, 5], center=true);
    translate([24, 15, 4.5]) cube([1, 1, 9], center=true);
    translate([24, 16, 4.5]) cube([1, 1, 9], center=true);
    translate([24, 17, 4.5]) cube([1, 1, 9], center=true);
    translate([24, 18, 4.5]) cube([1, 1, 9], center=true);
    translate([24, 19, 4.5]) cube([1, 1, 9], center=true);
    translate([24, 20, 4.5]) cube([1, 1, 9], center=true);
    translate([24, 21, 4.5]) cube([1, 1, 9], center=true);
    translate([24, 22, 4.5]) cube([1, 1, 9], center=true);
    translate([24, 23, 4.5]) cube([1, 1, 9], center=true);
    translate([24, 24, 4.5]) cube([1, 1, 9], center=true);
    translate([25, 0, 4.5]) cube([1, 1, 9], center=true);
    translate([25, 1, 4.5]) cube([1, 1, 9], center=true);
    translate([25, 2, 4.5]) cube([1, 1, 9], center=true);
    translate([25, 3, 4.5]) cube([1, 1, 9], center=true);
    translate([25, 4, 4.5]) cube([1, 1, 9], center=true);
    translate([25, 5, 4.5]) cube([1, 1, 9], center=true);
    translate([25, 6, 4.5]) cube([1, 1, 9], center=true);
    translate([25, 7, 4.5]) cube([1, 1, 9], center=true);
    translate([25, 8, 4.5]) cube([1, 1, 9], center=true);
    translate([25, 9, 4.5]) cube([1, 1, 9], center=true);
    translate([25, 10, 4.5]) cube([1, 1, 9], center=true);
    translate([25, 11, 4.5]) cube([1, 1, 9], center=true);
    translate([25, 12, 4.5]) cube([1, 1, 9], center=true);
    translate([25, 13, 4.5]) cube([1, 1, 9], center=true);
    translate([25, 14, 2.5]) cube([1, 1, 5], center=true);
    translate([25, 15, 4.5]) cube([1, 1, 9], center=true);
    translate([25, 16, 4.5]) cube([1, 1, 9], center=true);
    translate([25, 17, 4.5]) cube([1, 1, 9], center=true);
    translate([25, 18, 4.5]) cube([1, 1, 9], center=true);
    translate([25, 19, 4.5]) cube([1, 1, 9], center=true);
    translate([25, 20, 4.5]) cube([1, 1, 9], center=true);
    translate([25, 21, 4.5]) cube([1, 1, 9], center=true);
    translate([25, 22, 4.5]) cube([1, 1, 9], center=true);
    translate([25, 23, 4.5]) cube([1, 1, 9], center=true);
    translate([25, 24, 4.5]) cube([1, 1, 9], center=true);
}
